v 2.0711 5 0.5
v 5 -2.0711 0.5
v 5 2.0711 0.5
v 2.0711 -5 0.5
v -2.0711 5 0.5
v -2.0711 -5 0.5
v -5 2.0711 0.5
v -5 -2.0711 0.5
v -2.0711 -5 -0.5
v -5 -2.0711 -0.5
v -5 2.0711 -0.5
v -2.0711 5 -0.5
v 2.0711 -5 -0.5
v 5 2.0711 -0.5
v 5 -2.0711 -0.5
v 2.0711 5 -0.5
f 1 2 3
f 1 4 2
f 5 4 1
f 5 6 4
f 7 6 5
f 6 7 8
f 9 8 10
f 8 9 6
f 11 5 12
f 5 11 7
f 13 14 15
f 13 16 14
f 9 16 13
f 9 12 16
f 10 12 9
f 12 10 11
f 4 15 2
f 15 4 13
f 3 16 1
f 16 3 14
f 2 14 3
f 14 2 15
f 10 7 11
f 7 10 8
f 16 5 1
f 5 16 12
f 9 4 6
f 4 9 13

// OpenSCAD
// http://cl.ly/image/0f0M1U1D0n3T

module sunk_screw(size) {
  difference() {
    rotate([0,0,45]) cube([size,size,1], center=true);
    translate([size,0,0]) cube([size,size,2], center=true);
    translate([-size,0,0]) cube([size,size,2], center=true);
    translate([0,size,0]) cube([size,size,2], center=true);
    translate([0,-size,0]) cube([size,size,2], center=true);
  }
}

sunk_screw(10);
